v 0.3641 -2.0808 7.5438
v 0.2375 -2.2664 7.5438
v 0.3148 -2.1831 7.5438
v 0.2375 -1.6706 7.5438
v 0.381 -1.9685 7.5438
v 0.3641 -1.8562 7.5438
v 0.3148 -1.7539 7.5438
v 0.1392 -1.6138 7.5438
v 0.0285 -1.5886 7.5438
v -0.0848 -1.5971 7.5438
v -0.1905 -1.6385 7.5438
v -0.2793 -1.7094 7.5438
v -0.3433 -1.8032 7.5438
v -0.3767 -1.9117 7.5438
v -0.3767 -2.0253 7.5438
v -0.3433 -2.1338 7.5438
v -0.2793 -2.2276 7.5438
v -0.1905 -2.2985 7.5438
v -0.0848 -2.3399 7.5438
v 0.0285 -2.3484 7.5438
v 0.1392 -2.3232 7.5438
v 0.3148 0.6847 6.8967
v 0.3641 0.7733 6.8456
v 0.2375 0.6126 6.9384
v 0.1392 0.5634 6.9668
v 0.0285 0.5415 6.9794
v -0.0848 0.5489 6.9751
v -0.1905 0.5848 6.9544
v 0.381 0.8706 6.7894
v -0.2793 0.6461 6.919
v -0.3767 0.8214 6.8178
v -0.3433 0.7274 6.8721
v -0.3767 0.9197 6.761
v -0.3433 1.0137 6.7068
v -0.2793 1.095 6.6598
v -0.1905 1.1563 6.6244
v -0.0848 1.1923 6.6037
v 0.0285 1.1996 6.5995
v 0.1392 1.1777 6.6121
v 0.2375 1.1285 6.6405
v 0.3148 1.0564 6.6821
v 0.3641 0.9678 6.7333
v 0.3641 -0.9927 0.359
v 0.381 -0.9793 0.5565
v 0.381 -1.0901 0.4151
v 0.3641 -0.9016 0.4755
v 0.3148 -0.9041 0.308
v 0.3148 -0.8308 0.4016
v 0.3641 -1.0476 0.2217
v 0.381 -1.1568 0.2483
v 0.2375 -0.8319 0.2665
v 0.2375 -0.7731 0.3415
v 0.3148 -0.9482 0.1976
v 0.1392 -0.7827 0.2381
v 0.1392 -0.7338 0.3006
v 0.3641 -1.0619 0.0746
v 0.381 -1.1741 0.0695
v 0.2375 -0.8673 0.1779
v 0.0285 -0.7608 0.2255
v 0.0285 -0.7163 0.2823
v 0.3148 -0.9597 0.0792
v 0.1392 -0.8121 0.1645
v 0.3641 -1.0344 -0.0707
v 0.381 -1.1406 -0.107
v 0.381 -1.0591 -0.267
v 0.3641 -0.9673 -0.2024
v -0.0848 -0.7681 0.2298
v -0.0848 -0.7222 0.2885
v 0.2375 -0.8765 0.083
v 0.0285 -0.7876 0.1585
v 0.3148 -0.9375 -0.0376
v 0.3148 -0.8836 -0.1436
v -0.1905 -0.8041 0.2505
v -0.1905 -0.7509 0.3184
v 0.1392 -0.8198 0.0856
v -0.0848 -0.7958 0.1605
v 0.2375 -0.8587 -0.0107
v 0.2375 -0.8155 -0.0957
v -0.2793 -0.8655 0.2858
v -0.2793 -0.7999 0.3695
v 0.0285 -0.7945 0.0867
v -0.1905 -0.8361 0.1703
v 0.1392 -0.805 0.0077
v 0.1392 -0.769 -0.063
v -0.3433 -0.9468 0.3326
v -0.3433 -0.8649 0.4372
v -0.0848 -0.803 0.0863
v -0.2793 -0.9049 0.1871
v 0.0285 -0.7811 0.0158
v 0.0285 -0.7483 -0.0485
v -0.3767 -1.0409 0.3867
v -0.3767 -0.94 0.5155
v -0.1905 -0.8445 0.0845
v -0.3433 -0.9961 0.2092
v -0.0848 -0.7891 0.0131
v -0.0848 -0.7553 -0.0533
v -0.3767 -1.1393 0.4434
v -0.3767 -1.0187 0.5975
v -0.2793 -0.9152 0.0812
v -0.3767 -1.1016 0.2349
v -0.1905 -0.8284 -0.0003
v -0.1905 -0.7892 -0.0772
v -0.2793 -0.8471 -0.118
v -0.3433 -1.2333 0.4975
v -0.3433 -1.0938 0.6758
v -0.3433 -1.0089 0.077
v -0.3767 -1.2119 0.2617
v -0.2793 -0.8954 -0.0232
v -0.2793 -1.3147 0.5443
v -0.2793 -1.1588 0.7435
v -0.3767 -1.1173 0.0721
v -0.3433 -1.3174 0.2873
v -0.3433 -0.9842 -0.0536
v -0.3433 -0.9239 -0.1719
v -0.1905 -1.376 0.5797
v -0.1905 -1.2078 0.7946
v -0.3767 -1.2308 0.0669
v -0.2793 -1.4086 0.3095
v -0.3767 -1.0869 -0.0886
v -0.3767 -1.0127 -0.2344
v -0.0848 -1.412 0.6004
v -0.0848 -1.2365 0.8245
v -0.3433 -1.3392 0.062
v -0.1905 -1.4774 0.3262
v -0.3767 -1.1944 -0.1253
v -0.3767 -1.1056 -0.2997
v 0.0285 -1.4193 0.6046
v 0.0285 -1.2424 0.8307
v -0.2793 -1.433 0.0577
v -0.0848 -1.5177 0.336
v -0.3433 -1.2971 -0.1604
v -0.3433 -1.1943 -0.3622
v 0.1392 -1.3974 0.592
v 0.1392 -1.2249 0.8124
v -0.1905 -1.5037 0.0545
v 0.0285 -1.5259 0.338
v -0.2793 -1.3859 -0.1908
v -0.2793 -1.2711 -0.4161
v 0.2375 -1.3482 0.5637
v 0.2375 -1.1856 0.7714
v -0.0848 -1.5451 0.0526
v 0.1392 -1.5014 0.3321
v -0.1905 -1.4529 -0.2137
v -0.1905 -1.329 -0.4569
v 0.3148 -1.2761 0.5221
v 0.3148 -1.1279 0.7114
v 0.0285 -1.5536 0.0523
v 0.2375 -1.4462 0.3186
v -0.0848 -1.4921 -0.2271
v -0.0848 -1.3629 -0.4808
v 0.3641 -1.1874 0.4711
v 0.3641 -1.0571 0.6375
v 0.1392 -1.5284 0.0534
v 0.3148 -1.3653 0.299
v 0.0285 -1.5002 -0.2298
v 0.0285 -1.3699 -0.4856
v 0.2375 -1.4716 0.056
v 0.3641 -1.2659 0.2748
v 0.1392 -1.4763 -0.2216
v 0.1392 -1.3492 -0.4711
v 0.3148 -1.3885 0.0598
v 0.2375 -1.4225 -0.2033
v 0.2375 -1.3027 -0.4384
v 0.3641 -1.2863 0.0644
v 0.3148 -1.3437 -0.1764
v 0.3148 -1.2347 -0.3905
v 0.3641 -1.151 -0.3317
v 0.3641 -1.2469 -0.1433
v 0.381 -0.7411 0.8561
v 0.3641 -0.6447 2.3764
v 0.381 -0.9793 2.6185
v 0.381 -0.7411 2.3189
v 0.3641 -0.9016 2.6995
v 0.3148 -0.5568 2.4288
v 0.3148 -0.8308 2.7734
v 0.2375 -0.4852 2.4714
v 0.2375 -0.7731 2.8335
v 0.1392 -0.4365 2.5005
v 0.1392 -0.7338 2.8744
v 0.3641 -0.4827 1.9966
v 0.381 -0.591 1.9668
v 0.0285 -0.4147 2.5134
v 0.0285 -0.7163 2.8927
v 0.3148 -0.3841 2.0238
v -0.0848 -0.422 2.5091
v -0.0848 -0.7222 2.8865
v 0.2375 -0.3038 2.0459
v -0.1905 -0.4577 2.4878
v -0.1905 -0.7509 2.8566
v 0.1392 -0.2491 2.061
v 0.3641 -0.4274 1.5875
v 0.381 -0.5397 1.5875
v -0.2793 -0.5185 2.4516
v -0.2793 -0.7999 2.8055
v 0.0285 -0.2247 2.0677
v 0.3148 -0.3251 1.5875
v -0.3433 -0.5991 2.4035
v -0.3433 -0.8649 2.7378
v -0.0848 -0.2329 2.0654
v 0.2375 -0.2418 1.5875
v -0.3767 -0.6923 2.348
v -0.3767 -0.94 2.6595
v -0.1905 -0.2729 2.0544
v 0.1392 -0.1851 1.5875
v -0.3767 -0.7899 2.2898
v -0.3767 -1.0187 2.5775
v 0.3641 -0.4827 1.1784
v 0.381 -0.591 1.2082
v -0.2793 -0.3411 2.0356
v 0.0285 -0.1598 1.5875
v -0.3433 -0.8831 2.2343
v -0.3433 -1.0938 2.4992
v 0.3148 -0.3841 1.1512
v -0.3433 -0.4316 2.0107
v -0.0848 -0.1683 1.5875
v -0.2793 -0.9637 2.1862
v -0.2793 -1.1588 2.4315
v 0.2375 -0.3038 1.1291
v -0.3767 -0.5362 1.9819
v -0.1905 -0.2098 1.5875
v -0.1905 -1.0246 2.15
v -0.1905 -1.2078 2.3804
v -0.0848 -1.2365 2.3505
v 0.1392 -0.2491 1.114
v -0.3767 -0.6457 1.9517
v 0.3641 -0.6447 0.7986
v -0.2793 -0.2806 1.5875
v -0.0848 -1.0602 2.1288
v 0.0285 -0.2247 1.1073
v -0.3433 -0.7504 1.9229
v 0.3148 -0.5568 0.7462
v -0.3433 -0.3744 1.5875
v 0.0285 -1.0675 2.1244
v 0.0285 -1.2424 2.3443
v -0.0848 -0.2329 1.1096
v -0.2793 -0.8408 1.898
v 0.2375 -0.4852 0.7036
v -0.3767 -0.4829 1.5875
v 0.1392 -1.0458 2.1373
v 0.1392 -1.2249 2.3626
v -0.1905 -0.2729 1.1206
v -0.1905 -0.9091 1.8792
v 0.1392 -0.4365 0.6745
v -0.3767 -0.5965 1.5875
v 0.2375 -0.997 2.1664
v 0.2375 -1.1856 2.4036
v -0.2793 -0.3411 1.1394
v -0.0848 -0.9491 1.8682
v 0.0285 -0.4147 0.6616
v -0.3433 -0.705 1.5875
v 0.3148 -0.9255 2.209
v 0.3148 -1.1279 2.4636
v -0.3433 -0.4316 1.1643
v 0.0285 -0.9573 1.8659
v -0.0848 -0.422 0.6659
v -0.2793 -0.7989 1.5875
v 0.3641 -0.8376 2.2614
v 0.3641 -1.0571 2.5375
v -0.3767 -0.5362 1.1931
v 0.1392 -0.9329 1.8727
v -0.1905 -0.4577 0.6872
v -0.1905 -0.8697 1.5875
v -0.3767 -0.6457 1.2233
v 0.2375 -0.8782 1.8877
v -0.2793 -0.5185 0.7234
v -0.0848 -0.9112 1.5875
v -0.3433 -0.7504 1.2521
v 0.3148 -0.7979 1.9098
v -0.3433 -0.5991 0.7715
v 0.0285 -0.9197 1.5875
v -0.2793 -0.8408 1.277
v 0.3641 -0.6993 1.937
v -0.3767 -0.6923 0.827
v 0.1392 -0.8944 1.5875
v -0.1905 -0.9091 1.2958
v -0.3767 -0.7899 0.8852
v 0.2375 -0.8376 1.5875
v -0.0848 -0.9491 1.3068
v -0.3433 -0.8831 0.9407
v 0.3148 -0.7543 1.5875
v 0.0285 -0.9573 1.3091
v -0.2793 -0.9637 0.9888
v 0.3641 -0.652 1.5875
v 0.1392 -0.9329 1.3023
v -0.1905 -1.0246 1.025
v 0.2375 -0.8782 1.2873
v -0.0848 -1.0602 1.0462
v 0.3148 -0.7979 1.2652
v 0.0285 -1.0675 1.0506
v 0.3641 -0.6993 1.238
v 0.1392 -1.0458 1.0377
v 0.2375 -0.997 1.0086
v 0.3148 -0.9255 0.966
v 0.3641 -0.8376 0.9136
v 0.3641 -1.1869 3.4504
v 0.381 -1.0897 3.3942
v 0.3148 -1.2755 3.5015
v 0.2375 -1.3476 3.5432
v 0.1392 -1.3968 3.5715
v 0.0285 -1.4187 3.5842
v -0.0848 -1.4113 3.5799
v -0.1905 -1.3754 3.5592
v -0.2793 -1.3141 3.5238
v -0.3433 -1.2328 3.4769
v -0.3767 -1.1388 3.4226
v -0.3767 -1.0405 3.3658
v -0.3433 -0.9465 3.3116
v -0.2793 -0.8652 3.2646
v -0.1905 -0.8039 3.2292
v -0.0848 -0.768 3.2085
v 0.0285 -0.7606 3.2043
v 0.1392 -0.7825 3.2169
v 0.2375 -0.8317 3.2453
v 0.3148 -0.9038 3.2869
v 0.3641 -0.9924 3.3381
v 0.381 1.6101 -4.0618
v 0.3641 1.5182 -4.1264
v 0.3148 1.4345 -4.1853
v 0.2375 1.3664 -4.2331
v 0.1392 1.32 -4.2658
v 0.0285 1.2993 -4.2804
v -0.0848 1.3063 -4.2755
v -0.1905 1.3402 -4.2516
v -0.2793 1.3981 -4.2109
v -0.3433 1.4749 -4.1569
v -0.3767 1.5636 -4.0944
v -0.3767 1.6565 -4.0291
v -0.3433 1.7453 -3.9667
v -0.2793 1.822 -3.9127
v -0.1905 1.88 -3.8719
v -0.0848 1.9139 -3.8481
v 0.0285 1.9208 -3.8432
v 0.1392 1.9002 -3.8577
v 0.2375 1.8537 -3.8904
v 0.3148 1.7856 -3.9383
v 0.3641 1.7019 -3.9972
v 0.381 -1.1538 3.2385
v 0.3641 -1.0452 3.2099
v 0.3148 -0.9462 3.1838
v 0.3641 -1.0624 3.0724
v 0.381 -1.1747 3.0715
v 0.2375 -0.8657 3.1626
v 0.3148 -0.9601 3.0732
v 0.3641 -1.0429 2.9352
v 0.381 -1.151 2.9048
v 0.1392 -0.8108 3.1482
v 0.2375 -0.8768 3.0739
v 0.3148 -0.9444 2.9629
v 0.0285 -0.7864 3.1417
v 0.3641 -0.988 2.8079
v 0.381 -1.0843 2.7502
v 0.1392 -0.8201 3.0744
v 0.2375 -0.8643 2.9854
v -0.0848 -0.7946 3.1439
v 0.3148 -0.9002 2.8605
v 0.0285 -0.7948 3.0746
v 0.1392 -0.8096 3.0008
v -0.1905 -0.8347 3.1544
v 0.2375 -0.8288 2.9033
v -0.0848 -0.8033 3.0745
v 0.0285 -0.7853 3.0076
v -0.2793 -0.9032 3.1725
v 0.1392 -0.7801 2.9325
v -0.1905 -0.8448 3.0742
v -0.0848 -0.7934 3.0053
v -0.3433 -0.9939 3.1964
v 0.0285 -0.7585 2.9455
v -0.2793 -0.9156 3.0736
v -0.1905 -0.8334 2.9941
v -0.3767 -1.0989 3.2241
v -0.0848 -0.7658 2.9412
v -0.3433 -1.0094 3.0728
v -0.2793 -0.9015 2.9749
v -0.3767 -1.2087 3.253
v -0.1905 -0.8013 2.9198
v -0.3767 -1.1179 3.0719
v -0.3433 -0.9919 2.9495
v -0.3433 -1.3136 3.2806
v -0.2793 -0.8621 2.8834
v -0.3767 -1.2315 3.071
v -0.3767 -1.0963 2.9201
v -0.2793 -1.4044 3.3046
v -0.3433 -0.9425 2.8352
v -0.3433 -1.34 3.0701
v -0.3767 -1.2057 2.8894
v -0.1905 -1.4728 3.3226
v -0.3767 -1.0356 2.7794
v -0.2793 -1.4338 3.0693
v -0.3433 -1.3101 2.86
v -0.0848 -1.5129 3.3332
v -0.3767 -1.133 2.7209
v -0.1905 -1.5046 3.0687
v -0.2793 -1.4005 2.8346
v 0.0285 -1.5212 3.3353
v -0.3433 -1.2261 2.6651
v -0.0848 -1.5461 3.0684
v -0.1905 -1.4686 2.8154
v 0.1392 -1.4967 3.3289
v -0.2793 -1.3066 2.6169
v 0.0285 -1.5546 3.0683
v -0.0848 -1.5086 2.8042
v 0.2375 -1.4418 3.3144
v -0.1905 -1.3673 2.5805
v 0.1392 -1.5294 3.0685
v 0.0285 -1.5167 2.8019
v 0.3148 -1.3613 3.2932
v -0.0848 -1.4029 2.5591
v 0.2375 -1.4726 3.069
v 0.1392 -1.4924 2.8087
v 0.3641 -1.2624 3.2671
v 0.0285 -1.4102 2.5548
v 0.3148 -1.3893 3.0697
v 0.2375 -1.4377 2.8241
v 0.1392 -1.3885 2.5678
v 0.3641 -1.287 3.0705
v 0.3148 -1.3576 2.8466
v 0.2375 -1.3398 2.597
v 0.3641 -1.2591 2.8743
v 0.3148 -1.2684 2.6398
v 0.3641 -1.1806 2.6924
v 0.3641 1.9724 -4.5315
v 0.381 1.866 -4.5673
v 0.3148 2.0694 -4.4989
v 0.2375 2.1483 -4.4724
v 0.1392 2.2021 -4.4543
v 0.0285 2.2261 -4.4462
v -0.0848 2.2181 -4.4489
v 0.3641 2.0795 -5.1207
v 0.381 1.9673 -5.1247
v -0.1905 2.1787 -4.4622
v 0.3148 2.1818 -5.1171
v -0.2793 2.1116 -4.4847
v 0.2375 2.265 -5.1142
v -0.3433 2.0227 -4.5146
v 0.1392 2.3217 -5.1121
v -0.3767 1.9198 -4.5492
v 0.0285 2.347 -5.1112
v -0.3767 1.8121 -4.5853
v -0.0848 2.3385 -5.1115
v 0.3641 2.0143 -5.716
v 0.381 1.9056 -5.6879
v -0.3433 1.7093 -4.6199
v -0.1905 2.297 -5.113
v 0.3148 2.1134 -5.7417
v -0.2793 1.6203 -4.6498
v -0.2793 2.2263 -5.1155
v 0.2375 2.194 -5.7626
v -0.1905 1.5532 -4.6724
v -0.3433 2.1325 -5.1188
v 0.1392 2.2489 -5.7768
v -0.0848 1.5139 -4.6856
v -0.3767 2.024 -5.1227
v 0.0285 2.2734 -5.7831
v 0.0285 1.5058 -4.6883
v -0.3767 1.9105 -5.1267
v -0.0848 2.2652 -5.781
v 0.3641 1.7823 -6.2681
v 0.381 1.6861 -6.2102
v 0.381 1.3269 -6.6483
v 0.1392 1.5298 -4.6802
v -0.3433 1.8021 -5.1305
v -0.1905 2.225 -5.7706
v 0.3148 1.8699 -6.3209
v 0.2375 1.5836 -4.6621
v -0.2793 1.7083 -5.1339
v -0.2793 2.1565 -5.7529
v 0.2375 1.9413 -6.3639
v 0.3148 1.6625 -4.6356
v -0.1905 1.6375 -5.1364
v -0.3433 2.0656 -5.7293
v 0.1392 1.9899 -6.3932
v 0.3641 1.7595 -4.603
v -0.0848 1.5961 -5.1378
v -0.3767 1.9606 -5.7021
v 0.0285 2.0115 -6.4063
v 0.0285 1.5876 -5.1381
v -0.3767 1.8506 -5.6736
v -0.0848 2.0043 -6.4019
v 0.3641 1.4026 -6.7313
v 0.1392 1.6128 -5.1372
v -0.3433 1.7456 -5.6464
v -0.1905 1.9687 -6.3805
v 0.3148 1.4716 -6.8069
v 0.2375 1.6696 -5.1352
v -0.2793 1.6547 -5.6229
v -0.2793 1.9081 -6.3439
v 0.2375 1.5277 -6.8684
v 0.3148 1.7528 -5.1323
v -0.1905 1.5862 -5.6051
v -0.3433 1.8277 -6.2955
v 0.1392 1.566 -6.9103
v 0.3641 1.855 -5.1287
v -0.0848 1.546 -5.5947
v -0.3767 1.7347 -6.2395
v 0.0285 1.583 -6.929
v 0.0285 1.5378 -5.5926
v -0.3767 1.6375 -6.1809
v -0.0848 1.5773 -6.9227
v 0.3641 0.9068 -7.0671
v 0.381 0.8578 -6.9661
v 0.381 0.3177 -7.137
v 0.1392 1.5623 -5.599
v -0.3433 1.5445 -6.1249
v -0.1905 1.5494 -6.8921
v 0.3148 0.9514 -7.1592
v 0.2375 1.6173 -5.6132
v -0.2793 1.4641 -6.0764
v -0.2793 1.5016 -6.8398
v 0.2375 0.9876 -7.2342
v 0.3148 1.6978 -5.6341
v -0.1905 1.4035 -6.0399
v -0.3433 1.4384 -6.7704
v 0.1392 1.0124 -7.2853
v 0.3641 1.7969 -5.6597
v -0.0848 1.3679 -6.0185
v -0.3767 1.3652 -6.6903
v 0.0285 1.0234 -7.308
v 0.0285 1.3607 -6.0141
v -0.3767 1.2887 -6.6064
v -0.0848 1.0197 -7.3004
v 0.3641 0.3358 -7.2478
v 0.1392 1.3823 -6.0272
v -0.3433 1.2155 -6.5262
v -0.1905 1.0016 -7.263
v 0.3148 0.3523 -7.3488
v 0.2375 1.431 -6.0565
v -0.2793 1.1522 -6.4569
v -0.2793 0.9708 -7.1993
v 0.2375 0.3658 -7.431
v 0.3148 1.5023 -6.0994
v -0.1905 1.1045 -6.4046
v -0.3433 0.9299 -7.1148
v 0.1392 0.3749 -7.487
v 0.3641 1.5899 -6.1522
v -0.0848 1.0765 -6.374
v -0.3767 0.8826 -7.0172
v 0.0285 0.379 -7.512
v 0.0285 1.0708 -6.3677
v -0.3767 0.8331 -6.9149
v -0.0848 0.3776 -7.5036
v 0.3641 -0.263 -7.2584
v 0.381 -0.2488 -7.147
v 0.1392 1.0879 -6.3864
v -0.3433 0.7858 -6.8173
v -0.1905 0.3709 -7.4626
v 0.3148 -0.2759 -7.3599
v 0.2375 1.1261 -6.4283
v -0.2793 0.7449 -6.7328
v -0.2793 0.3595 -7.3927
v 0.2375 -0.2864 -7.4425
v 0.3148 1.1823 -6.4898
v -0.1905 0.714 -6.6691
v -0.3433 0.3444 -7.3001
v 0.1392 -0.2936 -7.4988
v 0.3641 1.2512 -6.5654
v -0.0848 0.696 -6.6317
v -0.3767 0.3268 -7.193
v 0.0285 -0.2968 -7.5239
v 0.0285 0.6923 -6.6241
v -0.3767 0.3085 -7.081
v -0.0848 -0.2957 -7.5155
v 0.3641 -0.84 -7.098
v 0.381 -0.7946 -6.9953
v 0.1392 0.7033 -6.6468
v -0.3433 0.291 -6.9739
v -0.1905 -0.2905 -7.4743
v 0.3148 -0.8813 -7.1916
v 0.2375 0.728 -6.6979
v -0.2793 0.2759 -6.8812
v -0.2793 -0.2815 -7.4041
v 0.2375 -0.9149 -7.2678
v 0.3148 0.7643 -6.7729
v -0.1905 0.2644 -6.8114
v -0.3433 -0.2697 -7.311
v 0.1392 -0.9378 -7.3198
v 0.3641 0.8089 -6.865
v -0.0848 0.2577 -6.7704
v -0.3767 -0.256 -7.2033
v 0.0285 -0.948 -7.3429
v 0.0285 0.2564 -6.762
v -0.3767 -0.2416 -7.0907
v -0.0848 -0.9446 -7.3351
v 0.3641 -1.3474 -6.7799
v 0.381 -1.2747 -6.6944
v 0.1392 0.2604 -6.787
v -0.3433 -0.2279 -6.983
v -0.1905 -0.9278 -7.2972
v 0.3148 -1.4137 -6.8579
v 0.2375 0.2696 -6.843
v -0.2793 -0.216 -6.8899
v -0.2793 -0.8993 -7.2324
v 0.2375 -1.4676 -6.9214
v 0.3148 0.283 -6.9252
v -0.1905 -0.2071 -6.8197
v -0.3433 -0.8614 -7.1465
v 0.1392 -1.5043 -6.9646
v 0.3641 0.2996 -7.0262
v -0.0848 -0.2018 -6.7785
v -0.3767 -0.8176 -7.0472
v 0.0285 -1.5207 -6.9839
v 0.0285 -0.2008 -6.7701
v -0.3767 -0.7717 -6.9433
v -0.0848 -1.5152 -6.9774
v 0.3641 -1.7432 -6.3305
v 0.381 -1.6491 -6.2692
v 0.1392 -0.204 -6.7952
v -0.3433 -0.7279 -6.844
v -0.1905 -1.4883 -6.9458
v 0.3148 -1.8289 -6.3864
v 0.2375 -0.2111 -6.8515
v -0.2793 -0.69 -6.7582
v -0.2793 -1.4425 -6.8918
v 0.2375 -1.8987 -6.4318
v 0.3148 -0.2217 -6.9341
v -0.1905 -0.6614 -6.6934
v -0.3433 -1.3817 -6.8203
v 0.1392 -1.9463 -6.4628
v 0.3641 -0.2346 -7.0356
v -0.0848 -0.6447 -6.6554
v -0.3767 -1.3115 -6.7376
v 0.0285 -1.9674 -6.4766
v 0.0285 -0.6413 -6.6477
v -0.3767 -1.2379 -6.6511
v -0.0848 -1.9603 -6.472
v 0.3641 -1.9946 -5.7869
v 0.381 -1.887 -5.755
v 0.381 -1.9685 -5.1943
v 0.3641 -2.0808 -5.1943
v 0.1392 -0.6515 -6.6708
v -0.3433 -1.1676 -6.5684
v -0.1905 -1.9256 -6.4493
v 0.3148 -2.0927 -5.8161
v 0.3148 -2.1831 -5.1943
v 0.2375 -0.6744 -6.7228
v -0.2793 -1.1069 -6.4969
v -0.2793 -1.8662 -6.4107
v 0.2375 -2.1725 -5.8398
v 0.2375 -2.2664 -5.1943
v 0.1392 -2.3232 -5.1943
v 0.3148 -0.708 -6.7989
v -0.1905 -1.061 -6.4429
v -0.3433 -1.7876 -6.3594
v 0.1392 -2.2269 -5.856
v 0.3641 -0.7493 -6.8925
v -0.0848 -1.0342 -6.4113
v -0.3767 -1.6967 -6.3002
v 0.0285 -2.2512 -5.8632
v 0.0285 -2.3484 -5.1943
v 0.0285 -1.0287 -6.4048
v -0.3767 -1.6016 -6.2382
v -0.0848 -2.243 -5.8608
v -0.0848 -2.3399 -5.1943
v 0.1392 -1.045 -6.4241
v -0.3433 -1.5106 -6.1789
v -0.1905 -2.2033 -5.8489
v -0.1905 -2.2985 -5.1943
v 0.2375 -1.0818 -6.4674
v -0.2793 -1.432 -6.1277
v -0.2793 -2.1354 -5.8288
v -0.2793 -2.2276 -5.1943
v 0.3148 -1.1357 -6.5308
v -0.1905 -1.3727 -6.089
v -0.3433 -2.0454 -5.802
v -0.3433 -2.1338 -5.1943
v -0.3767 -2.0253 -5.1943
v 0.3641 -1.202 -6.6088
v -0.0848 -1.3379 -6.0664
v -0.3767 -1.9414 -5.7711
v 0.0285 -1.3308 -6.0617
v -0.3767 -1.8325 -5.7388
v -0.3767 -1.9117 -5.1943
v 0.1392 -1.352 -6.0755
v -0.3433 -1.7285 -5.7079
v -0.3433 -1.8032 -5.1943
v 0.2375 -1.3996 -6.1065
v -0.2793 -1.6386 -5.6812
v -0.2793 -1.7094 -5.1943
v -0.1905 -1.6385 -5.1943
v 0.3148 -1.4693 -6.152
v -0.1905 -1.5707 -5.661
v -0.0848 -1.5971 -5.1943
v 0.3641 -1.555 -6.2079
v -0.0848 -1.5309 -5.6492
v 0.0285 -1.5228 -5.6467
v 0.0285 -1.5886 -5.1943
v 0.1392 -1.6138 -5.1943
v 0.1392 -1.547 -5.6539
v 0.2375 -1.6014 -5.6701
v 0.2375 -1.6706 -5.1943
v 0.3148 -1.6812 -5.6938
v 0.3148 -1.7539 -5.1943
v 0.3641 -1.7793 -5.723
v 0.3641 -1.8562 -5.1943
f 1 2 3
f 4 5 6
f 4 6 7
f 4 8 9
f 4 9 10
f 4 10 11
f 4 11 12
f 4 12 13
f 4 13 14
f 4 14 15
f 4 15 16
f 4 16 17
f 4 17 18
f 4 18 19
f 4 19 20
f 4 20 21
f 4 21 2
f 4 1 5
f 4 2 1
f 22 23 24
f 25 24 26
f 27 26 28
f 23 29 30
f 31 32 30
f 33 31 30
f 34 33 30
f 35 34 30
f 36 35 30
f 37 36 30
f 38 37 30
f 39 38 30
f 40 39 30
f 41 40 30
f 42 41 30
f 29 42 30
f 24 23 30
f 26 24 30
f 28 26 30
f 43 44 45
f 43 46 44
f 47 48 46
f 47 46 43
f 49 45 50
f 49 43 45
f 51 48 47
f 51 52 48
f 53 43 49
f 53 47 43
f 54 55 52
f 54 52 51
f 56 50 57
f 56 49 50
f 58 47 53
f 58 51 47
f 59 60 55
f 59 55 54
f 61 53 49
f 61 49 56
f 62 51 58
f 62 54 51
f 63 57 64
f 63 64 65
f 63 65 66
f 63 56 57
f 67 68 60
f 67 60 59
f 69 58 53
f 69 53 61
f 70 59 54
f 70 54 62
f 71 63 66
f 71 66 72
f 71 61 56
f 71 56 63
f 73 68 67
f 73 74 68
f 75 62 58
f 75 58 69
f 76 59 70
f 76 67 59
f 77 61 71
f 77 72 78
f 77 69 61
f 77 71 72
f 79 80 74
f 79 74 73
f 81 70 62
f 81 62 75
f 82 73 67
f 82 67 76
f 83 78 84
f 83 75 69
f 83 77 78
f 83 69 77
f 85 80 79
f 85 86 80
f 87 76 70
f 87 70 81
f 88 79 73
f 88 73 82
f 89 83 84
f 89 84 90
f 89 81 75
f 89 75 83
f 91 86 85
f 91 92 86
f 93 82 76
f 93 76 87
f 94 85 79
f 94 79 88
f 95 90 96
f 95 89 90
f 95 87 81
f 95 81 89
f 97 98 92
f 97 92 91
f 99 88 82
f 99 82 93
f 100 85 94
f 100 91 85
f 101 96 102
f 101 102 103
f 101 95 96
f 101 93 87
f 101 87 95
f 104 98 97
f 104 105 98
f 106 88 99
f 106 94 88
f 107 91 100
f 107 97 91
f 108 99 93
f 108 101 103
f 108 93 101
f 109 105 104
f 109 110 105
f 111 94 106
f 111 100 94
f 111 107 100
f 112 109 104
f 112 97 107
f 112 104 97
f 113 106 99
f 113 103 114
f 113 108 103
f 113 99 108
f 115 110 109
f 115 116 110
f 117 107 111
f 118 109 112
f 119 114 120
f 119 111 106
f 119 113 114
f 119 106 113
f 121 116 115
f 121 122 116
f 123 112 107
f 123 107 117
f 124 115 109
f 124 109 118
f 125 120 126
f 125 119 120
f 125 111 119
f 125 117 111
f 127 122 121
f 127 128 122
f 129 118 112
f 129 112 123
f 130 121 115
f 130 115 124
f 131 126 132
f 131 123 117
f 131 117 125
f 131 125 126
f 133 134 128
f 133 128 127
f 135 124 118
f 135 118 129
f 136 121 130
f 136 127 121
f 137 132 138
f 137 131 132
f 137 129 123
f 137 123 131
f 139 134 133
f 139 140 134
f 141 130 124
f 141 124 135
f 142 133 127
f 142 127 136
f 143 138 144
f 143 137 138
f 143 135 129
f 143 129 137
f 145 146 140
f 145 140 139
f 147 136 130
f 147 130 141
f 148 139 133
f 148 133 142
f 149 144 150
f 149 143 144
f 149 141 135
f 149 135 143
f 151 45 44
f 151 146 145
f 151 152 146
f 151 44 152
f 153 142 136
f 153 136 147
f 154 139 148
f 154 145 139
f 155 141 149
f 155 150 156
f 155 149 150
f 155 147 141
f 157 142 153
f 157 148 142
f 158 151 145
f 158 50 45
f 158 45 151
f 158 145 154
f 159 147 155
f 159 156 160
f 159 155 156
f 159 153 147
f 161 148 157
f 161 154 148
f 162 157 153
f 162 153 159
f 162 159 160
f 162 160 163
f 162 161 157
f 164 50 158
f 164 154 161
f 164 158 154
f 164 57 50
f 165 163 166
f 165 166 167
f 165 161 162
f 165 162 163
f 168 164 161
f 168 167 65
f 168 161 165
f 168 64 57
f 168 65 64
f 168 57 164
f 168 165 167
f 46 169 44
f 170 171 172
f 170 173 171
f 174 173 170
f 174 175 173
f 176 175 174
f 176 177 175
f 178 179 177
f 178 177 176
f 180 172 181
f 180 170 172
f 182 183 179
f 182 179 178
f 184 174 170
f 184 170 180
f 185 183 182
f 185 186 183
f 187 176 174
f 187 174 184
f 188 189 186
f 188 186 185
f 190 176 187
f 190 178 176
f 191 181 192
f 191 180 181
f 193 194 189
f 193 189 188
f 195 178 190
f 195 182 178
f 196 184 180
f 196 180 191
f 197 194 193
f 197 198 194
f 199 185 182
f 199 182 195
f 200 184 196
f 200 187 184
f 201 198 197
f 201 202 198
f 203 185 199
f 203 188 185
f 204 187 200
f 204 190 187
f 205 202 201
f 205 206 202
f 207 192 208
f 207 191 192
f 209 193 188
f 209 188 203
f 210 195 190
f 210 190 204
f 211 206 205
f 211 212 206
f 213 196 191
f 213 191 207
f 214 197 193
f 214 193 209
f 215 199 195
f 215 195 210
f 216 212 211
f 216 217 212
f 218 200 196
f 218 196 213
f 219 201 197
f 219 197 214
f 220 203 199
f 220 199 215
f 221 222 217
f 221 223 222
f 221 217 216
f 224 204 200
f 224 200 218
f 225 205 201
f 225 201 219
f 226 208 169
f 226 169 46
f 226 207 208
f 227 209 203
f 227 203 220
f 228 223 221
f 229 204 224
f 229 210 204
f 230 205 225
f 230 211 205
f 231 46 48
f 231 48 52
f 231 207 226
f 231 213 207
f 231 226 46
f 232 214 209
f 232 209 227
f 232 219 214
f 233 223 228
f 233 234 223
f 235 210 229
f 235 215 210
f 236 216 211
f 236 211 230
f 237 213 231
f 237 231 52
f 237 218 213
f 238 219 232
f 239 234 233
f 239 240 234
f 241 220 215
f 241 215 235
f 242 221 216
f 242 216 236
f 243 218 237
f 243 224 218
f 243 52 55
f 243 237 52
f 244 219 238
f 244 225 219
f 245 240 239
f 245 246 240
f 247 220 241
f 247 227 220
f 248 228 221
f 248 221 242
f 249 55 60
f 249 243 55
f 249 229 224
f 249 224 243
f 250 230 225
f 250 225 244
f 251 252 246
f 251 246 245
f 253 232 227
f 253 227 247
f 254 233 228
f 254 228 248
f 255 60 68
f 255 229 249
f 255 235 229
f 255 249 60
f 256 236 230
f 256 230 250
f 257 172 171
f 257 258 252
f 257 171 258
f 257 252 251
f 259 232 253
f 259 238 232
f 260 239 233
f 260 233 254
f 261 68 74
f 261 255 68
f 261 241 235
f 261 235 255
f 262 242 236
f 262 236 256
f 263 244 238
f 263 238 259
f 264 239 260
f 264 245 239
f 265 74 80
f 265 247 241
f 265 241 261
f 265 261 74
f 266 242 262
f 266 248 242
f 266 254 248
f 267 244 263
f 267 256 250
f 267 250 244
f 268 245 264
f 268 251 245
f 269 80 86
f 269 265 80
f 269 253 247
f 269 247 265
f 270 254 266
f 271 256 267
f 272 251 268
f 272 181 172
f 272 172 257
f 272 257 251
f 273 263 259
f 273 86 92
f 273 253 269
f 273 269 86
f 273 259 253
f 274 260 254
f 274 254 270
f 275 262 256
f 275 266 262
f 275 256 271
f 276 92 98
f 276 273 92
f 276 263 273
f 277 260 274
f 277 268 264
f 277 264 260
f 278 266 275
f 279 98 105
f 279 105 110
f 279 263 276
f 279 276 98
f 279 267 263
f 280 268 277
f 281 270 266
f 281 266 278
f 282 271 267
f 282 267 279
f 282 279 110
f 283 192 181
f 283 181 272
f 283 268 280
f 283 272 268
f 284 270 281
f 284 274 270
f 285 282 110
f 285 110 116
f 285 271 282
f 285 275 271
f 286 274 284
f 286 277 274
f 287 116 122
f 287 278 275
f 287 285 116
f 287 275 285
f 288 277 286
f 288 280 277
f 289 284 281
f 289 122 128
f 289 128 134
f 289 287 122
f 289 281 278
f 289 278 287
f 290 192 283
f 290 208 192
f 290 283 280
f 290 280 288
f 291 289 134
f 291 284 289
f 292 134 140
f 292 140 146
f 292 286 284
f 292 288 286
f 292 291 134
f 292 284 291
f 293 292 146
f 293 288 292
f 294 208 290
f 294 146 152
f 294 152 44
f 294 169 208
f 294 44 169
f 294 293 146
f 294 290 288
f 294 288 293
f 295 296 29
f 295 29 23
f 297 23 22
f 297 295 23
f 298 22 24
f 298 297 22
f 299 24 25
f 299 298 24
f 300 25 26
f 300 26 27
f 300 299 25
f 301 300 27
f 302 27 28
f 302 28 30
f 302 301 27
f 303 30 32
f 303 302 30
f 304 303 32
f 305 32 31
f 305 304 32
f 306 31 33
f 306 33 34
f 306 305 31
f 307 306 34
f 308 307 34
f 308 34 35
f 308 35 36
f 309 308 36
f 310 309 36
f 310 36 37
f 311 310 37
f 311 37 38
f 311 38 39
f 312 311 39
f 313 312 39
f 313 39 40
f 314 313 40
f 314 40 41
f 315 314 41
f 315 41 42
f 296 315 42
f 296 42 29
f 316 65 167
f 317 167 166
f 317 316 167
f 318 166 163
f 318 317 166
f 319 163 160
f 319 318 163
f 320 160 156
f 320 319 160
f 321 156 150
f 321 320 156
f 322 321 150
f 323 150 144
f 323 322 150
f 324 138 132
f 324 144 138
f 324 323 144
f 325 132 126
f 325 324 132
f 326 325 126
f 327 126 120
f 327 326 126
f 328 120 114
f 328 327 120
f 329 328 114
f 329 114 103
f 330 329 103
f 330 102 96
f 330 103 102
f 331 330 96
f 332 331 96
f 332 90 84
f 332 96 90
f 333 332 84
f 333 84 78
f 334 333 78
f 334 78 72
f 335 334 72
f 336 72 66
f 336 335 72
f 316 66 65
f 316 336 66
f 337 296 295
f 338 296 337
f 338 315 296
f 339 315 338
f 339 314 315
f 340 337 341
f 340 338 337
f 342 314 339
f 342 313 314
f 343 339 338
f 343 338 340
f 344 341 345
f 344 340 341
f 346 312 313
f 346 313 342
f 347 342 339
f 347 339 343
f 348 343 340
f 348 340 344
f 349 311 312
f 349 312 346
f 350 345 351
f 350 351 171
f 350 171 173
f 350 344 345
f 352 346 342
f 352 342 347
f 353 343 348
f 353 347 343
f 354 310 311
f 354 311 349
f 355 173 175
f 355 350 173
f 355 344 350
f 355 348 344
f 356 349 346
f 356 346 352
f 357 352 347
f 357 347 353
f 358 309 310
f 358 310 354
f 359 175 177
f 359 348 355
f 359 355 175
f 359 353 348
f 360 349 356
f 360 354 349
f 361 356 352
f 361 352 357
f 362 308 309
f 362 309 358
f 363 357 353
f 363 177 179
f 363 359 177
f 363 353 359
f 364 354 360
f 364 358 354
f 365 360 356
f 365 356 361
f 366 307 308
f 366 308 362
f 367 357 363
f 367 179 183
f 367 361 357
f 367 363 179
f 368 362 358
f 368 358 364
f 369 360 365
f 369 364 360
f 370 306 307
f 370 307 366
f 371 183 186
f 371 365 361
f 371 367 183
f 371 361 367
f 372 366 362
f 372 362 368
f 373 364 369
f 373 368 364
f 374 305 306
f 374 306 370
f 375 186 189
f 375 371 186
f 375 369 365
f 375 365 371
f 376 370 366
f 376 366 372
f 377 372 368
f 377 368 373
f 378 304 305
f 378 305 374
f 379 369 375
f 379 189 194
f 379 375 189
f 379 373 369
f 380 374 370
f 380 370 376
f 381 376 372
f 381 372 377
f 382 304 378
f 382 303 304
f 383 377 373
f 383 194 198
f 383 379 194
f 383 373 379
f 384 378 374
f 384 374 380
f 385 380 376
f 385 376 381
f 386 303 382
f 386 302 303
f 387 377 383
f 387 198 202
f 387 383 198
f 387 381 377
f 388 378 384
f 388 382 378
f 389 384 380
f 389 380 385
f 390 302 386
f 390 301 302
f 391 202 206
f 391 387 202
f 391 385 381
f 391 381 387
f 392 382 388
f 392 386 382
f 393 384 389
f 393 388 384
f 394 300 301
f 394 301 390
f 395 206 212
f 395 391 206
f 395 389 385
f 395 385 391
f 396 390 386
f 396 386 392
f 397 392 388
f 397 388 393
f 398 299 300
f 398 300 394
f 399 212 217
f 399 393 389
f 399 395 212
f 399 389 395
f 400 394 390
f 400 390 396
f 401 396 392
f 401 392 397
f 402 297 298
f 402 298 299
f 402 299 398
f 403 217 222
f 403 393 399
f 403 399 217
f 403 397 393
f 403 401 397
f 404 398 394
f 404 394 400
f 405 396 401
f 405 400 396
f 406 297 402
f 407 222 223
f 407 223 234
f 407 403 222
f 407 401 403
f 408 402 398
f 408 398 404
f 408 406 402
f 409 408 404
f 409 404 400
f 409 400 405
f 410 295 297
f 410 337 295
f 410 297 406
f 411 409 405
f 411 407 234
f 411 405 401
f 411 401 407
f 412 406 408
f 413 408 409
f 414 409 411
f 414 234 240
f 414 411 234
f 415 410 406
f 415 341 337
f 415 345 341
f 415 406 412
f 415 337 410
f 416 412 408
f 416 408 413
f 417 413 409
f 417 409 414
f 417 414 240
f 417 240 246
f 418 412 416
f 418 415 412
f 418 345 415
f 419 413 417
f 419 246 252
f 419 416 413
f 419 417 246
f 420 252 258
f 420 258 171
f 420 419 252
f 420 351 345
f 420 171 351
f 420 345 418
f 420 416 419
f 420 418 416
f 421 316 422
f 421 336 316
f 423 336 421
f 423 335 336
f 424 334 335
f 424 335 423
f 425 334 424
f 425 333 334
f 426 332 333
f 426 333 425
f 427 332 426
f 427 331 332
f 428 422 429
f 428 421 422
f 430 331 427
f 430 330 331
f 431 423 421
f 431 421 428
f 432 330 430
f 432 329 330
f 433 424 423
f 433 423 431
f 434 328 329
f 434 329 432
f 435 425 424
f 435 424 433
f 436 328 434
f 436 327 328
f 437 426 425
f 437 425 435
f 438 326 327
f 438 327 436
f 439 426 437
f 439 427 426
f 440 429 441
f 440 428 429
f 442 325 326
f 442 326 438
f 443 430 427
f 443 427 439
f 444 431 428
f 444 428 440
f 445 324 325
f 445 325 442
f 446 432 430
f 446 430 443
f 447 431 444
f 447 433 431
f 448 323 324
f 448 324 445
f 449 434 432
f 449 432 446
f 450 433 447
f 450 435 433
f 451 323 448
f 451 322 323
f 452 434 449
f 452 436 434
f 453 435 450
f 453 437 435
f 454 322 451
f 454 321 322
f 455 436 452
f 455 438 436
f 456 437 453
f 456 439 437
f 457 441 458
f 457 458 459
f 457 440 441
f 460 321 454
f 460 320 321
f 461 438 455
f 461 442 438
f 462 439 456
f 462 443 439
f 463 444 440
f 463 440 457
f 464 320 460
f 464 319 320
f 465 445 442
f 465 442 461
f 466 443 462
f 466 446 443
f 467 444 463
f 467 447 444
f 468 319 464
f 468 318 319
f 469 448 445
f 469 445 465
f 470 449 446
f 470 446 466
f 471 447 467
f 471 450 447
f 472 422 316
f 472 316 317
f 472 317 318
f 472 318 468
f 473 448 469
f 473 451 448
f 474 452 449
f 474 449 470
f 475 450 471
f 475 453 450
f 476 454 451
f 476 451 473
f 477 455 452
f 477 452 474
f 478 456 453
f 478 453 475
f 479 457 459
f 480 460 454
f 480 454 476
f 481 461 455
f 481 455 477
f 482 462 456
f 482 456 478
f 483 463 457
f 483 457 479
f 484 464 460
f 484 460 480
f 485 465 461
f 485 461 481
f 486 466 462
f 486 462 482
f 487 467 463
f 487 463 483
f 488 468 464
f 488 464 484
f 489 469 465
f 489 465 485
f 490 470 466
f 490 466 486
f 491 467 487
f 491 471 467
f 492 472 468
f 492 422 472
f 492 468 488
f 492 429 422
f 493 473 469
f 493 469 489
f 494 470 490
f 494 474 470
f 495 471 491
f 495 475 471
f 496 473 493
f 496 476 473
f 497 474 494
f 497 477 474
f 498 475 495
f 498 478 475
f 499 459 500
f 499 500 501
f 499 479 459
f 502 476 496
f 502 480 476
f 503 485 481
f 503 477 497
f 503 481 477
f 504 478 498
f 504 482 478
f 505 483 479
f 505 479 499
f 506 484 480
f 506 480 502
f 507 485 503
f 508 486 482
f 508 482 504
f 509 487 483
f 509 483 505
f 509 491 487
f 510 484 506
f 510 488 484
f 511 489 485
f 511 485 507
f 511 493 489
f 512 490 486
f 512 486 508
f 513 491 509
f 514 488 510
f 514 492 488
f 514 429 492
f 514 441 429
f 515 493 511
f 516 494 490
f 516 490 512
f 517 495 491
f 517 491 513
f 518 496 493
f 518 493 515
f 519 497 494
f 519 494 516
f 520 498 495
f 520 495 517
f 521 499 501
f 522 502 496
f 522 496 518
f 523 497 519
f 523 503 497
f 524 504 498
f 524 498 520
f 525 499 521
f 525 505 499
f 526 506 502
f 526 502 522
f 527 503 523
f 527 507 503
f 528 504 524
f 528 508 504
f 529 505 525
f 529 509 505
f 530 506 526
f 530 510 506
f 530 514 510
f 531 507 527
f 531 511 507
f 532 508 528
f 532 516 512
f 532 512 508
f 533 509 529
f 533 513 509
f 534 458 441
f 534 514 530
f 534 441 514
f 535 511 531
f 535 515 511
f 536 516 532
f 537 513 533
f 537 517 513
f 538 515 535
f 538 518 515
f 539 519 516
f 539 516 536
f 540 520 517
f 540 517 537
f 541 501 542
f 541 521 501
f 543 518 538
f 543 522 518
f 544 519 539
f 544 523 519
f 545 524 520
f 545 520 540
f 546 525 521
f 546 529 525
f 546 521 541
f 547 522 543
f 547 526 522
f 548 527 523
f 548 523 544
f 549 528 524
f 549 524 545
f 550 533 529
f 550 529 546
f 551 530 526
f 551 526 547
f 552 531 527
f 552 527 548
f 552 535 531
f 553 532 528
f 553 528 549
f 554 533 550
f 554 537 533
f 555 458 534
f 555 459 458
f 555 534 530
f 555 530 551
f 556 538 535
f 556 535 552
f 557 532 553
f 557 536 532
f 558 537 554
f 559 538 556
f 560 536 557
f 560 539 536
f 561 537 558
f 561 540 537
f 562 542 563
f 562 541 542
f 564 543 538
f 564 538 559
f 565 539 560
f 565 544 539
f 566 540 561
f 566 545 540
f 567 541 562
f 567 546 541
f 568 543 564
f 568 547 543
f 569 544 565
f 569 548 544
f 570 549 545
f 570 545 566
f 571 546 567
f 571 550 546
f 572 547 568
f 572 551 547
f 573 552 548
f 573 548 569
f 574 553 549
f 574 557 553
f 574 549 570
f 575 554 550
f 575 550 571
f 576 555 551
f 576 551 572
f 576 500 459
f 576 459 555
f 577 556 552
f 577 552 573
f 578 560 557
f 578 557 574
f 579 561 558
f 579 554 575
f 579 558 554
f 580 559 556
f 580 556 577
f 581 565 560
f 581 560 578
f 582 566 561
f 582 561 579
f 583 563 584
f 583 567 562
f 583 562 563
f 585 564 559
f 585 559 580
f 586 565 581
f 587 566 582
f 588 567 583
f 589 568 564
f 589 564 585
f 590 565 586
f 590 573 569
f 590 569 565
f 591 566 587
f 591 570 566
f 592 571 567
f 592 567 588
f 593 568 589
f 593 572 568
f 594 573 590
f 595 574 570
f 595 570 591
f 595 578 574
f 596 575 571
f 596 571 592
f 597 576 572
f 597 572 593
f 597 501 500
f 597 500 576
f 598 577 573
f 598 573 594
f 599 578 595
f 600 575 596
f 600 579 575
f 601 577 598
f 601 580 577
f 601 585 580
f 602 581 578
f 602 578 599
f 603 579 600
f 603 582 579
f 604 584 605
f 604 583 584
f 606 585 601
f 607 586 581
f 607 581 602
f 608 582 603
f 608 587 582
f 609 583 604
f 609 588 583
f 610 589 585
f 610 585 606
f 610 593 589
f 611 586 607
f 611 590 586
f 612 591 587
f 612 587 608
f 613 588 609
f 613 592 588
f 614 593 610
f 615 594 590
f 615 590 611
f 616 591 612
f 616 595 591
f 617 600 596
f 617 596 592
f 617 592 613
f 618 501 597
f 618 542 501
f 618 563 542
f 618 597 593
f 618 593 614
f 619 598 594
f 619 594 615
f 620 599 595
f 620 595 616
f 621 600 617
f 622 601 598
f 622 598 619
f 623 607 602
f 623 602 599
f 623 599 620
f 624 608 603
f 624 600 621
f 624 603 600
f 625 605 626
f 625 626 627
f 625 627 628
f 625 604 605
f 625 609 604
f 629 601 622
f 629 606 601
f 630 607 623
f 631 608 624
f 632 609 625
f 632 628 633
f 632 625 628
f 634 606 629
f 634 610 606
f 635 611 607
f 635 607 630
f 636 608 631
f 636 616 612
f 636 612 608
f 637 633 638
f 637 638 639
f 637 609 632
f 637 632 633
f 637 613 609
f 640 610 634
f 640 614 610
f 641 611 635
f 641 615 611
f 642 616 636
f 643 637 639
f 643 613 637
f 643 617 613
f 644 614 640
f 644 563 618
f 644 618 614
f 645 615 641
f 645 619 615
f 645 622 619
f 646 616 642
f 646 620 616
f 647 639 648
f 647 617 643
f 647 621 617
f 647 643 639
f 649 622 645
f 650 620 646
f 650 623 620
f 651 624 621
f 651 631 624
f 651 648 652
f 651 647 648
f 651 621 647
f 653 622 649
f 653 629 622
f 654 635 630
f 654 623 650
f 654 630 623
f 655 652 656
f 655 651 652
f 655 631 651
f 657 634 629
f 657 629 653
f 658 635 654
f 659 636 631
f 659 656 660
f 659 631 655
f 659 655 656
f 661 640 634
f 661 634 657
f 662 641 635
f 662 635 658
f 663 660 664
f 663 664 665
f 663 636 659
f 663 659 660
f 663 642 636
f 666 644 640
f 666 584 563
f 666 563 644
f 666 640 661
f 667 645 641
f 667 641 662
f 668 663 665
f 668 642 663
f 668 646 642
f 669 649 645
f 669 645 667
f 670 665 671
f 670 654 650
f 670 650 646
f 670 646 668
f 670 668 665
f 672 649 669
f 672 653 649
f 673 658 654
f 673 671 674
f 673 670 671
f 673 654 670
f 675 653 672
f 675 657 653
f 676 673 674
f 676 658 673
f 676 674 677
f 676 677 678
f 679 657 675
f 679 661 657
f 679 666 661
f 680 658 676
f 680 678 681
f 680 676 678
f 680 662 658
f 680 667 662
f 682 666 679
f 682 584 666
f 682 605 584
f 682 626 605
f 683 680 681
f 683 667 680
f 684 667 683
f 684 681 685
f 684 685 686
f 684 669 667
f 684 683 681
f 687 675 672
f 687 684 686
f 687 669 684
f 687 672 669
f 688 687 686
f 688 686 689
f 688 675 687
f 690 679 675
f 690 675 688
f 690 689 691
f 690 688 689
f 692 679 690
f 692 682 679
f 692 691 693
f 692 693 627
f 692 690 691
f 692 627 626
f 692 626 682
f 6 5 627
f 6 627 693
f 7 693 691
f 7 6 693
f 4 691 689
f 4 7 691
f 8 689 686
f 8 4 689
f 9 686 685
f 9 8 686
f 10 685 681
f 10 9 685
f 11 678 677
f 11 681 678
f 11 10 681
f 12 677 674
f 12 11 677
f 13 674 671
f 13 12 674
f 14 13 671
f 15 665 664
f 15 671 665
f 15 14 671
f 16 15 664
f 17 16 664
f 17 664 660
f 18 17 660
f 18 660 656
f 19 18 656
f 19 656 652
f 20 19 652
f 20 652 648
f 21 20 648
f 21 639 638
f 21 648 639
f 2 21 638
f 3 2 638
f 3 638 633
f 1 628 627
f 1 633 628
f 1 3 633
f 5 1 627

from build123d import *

# Parameters (mm, degrees)
SKETCH3_R = 0.381


with BuildPart() as part:
    # Sweep1: sweep along a path in Sketch4
    with BuildLine(Plane(origin=(0, 0, 0), x_dir=(0, 0, -1), z_dir=(1, 0, 0))) as sweep1_path:
        Line((-6.78942, 0.870570192), (-3.394217856, -1.089650679))
        ThreePointArc((-3.394217856, -1.089650679), (-2.987318885, -1.1684), (-2.618502629, -0.979342342))
        ThreePointArc((-2.618502629, -0.979342342), (-1.5875, -0.539724548), (-0.556497371, -0.979342342))
        ThreePointArc((-0.556497371, -0.979342342), (-0.159498585, -1.17176691), (0.267049156, -1.059106914))
        Line((0.267049156, -1.059106914), (4.061772971, 1.610085333))
        ThreePointArc((4.061772971, 1.610085333), (7.071058539, 0.593944135), (5.1943, -1.9685))
        Line((5.1943, -1.9685), (-7.5438, -1.9685))
    # Sketch3 → Sweep1 (sweep)
    with BuildSketch(Plane.XY.offset(7.5438)):
        with Locations((0, -1.9685)):
            Circle(SKETCH3_R)
    sweep(path=sweep1_path.line)


solid = part.part
